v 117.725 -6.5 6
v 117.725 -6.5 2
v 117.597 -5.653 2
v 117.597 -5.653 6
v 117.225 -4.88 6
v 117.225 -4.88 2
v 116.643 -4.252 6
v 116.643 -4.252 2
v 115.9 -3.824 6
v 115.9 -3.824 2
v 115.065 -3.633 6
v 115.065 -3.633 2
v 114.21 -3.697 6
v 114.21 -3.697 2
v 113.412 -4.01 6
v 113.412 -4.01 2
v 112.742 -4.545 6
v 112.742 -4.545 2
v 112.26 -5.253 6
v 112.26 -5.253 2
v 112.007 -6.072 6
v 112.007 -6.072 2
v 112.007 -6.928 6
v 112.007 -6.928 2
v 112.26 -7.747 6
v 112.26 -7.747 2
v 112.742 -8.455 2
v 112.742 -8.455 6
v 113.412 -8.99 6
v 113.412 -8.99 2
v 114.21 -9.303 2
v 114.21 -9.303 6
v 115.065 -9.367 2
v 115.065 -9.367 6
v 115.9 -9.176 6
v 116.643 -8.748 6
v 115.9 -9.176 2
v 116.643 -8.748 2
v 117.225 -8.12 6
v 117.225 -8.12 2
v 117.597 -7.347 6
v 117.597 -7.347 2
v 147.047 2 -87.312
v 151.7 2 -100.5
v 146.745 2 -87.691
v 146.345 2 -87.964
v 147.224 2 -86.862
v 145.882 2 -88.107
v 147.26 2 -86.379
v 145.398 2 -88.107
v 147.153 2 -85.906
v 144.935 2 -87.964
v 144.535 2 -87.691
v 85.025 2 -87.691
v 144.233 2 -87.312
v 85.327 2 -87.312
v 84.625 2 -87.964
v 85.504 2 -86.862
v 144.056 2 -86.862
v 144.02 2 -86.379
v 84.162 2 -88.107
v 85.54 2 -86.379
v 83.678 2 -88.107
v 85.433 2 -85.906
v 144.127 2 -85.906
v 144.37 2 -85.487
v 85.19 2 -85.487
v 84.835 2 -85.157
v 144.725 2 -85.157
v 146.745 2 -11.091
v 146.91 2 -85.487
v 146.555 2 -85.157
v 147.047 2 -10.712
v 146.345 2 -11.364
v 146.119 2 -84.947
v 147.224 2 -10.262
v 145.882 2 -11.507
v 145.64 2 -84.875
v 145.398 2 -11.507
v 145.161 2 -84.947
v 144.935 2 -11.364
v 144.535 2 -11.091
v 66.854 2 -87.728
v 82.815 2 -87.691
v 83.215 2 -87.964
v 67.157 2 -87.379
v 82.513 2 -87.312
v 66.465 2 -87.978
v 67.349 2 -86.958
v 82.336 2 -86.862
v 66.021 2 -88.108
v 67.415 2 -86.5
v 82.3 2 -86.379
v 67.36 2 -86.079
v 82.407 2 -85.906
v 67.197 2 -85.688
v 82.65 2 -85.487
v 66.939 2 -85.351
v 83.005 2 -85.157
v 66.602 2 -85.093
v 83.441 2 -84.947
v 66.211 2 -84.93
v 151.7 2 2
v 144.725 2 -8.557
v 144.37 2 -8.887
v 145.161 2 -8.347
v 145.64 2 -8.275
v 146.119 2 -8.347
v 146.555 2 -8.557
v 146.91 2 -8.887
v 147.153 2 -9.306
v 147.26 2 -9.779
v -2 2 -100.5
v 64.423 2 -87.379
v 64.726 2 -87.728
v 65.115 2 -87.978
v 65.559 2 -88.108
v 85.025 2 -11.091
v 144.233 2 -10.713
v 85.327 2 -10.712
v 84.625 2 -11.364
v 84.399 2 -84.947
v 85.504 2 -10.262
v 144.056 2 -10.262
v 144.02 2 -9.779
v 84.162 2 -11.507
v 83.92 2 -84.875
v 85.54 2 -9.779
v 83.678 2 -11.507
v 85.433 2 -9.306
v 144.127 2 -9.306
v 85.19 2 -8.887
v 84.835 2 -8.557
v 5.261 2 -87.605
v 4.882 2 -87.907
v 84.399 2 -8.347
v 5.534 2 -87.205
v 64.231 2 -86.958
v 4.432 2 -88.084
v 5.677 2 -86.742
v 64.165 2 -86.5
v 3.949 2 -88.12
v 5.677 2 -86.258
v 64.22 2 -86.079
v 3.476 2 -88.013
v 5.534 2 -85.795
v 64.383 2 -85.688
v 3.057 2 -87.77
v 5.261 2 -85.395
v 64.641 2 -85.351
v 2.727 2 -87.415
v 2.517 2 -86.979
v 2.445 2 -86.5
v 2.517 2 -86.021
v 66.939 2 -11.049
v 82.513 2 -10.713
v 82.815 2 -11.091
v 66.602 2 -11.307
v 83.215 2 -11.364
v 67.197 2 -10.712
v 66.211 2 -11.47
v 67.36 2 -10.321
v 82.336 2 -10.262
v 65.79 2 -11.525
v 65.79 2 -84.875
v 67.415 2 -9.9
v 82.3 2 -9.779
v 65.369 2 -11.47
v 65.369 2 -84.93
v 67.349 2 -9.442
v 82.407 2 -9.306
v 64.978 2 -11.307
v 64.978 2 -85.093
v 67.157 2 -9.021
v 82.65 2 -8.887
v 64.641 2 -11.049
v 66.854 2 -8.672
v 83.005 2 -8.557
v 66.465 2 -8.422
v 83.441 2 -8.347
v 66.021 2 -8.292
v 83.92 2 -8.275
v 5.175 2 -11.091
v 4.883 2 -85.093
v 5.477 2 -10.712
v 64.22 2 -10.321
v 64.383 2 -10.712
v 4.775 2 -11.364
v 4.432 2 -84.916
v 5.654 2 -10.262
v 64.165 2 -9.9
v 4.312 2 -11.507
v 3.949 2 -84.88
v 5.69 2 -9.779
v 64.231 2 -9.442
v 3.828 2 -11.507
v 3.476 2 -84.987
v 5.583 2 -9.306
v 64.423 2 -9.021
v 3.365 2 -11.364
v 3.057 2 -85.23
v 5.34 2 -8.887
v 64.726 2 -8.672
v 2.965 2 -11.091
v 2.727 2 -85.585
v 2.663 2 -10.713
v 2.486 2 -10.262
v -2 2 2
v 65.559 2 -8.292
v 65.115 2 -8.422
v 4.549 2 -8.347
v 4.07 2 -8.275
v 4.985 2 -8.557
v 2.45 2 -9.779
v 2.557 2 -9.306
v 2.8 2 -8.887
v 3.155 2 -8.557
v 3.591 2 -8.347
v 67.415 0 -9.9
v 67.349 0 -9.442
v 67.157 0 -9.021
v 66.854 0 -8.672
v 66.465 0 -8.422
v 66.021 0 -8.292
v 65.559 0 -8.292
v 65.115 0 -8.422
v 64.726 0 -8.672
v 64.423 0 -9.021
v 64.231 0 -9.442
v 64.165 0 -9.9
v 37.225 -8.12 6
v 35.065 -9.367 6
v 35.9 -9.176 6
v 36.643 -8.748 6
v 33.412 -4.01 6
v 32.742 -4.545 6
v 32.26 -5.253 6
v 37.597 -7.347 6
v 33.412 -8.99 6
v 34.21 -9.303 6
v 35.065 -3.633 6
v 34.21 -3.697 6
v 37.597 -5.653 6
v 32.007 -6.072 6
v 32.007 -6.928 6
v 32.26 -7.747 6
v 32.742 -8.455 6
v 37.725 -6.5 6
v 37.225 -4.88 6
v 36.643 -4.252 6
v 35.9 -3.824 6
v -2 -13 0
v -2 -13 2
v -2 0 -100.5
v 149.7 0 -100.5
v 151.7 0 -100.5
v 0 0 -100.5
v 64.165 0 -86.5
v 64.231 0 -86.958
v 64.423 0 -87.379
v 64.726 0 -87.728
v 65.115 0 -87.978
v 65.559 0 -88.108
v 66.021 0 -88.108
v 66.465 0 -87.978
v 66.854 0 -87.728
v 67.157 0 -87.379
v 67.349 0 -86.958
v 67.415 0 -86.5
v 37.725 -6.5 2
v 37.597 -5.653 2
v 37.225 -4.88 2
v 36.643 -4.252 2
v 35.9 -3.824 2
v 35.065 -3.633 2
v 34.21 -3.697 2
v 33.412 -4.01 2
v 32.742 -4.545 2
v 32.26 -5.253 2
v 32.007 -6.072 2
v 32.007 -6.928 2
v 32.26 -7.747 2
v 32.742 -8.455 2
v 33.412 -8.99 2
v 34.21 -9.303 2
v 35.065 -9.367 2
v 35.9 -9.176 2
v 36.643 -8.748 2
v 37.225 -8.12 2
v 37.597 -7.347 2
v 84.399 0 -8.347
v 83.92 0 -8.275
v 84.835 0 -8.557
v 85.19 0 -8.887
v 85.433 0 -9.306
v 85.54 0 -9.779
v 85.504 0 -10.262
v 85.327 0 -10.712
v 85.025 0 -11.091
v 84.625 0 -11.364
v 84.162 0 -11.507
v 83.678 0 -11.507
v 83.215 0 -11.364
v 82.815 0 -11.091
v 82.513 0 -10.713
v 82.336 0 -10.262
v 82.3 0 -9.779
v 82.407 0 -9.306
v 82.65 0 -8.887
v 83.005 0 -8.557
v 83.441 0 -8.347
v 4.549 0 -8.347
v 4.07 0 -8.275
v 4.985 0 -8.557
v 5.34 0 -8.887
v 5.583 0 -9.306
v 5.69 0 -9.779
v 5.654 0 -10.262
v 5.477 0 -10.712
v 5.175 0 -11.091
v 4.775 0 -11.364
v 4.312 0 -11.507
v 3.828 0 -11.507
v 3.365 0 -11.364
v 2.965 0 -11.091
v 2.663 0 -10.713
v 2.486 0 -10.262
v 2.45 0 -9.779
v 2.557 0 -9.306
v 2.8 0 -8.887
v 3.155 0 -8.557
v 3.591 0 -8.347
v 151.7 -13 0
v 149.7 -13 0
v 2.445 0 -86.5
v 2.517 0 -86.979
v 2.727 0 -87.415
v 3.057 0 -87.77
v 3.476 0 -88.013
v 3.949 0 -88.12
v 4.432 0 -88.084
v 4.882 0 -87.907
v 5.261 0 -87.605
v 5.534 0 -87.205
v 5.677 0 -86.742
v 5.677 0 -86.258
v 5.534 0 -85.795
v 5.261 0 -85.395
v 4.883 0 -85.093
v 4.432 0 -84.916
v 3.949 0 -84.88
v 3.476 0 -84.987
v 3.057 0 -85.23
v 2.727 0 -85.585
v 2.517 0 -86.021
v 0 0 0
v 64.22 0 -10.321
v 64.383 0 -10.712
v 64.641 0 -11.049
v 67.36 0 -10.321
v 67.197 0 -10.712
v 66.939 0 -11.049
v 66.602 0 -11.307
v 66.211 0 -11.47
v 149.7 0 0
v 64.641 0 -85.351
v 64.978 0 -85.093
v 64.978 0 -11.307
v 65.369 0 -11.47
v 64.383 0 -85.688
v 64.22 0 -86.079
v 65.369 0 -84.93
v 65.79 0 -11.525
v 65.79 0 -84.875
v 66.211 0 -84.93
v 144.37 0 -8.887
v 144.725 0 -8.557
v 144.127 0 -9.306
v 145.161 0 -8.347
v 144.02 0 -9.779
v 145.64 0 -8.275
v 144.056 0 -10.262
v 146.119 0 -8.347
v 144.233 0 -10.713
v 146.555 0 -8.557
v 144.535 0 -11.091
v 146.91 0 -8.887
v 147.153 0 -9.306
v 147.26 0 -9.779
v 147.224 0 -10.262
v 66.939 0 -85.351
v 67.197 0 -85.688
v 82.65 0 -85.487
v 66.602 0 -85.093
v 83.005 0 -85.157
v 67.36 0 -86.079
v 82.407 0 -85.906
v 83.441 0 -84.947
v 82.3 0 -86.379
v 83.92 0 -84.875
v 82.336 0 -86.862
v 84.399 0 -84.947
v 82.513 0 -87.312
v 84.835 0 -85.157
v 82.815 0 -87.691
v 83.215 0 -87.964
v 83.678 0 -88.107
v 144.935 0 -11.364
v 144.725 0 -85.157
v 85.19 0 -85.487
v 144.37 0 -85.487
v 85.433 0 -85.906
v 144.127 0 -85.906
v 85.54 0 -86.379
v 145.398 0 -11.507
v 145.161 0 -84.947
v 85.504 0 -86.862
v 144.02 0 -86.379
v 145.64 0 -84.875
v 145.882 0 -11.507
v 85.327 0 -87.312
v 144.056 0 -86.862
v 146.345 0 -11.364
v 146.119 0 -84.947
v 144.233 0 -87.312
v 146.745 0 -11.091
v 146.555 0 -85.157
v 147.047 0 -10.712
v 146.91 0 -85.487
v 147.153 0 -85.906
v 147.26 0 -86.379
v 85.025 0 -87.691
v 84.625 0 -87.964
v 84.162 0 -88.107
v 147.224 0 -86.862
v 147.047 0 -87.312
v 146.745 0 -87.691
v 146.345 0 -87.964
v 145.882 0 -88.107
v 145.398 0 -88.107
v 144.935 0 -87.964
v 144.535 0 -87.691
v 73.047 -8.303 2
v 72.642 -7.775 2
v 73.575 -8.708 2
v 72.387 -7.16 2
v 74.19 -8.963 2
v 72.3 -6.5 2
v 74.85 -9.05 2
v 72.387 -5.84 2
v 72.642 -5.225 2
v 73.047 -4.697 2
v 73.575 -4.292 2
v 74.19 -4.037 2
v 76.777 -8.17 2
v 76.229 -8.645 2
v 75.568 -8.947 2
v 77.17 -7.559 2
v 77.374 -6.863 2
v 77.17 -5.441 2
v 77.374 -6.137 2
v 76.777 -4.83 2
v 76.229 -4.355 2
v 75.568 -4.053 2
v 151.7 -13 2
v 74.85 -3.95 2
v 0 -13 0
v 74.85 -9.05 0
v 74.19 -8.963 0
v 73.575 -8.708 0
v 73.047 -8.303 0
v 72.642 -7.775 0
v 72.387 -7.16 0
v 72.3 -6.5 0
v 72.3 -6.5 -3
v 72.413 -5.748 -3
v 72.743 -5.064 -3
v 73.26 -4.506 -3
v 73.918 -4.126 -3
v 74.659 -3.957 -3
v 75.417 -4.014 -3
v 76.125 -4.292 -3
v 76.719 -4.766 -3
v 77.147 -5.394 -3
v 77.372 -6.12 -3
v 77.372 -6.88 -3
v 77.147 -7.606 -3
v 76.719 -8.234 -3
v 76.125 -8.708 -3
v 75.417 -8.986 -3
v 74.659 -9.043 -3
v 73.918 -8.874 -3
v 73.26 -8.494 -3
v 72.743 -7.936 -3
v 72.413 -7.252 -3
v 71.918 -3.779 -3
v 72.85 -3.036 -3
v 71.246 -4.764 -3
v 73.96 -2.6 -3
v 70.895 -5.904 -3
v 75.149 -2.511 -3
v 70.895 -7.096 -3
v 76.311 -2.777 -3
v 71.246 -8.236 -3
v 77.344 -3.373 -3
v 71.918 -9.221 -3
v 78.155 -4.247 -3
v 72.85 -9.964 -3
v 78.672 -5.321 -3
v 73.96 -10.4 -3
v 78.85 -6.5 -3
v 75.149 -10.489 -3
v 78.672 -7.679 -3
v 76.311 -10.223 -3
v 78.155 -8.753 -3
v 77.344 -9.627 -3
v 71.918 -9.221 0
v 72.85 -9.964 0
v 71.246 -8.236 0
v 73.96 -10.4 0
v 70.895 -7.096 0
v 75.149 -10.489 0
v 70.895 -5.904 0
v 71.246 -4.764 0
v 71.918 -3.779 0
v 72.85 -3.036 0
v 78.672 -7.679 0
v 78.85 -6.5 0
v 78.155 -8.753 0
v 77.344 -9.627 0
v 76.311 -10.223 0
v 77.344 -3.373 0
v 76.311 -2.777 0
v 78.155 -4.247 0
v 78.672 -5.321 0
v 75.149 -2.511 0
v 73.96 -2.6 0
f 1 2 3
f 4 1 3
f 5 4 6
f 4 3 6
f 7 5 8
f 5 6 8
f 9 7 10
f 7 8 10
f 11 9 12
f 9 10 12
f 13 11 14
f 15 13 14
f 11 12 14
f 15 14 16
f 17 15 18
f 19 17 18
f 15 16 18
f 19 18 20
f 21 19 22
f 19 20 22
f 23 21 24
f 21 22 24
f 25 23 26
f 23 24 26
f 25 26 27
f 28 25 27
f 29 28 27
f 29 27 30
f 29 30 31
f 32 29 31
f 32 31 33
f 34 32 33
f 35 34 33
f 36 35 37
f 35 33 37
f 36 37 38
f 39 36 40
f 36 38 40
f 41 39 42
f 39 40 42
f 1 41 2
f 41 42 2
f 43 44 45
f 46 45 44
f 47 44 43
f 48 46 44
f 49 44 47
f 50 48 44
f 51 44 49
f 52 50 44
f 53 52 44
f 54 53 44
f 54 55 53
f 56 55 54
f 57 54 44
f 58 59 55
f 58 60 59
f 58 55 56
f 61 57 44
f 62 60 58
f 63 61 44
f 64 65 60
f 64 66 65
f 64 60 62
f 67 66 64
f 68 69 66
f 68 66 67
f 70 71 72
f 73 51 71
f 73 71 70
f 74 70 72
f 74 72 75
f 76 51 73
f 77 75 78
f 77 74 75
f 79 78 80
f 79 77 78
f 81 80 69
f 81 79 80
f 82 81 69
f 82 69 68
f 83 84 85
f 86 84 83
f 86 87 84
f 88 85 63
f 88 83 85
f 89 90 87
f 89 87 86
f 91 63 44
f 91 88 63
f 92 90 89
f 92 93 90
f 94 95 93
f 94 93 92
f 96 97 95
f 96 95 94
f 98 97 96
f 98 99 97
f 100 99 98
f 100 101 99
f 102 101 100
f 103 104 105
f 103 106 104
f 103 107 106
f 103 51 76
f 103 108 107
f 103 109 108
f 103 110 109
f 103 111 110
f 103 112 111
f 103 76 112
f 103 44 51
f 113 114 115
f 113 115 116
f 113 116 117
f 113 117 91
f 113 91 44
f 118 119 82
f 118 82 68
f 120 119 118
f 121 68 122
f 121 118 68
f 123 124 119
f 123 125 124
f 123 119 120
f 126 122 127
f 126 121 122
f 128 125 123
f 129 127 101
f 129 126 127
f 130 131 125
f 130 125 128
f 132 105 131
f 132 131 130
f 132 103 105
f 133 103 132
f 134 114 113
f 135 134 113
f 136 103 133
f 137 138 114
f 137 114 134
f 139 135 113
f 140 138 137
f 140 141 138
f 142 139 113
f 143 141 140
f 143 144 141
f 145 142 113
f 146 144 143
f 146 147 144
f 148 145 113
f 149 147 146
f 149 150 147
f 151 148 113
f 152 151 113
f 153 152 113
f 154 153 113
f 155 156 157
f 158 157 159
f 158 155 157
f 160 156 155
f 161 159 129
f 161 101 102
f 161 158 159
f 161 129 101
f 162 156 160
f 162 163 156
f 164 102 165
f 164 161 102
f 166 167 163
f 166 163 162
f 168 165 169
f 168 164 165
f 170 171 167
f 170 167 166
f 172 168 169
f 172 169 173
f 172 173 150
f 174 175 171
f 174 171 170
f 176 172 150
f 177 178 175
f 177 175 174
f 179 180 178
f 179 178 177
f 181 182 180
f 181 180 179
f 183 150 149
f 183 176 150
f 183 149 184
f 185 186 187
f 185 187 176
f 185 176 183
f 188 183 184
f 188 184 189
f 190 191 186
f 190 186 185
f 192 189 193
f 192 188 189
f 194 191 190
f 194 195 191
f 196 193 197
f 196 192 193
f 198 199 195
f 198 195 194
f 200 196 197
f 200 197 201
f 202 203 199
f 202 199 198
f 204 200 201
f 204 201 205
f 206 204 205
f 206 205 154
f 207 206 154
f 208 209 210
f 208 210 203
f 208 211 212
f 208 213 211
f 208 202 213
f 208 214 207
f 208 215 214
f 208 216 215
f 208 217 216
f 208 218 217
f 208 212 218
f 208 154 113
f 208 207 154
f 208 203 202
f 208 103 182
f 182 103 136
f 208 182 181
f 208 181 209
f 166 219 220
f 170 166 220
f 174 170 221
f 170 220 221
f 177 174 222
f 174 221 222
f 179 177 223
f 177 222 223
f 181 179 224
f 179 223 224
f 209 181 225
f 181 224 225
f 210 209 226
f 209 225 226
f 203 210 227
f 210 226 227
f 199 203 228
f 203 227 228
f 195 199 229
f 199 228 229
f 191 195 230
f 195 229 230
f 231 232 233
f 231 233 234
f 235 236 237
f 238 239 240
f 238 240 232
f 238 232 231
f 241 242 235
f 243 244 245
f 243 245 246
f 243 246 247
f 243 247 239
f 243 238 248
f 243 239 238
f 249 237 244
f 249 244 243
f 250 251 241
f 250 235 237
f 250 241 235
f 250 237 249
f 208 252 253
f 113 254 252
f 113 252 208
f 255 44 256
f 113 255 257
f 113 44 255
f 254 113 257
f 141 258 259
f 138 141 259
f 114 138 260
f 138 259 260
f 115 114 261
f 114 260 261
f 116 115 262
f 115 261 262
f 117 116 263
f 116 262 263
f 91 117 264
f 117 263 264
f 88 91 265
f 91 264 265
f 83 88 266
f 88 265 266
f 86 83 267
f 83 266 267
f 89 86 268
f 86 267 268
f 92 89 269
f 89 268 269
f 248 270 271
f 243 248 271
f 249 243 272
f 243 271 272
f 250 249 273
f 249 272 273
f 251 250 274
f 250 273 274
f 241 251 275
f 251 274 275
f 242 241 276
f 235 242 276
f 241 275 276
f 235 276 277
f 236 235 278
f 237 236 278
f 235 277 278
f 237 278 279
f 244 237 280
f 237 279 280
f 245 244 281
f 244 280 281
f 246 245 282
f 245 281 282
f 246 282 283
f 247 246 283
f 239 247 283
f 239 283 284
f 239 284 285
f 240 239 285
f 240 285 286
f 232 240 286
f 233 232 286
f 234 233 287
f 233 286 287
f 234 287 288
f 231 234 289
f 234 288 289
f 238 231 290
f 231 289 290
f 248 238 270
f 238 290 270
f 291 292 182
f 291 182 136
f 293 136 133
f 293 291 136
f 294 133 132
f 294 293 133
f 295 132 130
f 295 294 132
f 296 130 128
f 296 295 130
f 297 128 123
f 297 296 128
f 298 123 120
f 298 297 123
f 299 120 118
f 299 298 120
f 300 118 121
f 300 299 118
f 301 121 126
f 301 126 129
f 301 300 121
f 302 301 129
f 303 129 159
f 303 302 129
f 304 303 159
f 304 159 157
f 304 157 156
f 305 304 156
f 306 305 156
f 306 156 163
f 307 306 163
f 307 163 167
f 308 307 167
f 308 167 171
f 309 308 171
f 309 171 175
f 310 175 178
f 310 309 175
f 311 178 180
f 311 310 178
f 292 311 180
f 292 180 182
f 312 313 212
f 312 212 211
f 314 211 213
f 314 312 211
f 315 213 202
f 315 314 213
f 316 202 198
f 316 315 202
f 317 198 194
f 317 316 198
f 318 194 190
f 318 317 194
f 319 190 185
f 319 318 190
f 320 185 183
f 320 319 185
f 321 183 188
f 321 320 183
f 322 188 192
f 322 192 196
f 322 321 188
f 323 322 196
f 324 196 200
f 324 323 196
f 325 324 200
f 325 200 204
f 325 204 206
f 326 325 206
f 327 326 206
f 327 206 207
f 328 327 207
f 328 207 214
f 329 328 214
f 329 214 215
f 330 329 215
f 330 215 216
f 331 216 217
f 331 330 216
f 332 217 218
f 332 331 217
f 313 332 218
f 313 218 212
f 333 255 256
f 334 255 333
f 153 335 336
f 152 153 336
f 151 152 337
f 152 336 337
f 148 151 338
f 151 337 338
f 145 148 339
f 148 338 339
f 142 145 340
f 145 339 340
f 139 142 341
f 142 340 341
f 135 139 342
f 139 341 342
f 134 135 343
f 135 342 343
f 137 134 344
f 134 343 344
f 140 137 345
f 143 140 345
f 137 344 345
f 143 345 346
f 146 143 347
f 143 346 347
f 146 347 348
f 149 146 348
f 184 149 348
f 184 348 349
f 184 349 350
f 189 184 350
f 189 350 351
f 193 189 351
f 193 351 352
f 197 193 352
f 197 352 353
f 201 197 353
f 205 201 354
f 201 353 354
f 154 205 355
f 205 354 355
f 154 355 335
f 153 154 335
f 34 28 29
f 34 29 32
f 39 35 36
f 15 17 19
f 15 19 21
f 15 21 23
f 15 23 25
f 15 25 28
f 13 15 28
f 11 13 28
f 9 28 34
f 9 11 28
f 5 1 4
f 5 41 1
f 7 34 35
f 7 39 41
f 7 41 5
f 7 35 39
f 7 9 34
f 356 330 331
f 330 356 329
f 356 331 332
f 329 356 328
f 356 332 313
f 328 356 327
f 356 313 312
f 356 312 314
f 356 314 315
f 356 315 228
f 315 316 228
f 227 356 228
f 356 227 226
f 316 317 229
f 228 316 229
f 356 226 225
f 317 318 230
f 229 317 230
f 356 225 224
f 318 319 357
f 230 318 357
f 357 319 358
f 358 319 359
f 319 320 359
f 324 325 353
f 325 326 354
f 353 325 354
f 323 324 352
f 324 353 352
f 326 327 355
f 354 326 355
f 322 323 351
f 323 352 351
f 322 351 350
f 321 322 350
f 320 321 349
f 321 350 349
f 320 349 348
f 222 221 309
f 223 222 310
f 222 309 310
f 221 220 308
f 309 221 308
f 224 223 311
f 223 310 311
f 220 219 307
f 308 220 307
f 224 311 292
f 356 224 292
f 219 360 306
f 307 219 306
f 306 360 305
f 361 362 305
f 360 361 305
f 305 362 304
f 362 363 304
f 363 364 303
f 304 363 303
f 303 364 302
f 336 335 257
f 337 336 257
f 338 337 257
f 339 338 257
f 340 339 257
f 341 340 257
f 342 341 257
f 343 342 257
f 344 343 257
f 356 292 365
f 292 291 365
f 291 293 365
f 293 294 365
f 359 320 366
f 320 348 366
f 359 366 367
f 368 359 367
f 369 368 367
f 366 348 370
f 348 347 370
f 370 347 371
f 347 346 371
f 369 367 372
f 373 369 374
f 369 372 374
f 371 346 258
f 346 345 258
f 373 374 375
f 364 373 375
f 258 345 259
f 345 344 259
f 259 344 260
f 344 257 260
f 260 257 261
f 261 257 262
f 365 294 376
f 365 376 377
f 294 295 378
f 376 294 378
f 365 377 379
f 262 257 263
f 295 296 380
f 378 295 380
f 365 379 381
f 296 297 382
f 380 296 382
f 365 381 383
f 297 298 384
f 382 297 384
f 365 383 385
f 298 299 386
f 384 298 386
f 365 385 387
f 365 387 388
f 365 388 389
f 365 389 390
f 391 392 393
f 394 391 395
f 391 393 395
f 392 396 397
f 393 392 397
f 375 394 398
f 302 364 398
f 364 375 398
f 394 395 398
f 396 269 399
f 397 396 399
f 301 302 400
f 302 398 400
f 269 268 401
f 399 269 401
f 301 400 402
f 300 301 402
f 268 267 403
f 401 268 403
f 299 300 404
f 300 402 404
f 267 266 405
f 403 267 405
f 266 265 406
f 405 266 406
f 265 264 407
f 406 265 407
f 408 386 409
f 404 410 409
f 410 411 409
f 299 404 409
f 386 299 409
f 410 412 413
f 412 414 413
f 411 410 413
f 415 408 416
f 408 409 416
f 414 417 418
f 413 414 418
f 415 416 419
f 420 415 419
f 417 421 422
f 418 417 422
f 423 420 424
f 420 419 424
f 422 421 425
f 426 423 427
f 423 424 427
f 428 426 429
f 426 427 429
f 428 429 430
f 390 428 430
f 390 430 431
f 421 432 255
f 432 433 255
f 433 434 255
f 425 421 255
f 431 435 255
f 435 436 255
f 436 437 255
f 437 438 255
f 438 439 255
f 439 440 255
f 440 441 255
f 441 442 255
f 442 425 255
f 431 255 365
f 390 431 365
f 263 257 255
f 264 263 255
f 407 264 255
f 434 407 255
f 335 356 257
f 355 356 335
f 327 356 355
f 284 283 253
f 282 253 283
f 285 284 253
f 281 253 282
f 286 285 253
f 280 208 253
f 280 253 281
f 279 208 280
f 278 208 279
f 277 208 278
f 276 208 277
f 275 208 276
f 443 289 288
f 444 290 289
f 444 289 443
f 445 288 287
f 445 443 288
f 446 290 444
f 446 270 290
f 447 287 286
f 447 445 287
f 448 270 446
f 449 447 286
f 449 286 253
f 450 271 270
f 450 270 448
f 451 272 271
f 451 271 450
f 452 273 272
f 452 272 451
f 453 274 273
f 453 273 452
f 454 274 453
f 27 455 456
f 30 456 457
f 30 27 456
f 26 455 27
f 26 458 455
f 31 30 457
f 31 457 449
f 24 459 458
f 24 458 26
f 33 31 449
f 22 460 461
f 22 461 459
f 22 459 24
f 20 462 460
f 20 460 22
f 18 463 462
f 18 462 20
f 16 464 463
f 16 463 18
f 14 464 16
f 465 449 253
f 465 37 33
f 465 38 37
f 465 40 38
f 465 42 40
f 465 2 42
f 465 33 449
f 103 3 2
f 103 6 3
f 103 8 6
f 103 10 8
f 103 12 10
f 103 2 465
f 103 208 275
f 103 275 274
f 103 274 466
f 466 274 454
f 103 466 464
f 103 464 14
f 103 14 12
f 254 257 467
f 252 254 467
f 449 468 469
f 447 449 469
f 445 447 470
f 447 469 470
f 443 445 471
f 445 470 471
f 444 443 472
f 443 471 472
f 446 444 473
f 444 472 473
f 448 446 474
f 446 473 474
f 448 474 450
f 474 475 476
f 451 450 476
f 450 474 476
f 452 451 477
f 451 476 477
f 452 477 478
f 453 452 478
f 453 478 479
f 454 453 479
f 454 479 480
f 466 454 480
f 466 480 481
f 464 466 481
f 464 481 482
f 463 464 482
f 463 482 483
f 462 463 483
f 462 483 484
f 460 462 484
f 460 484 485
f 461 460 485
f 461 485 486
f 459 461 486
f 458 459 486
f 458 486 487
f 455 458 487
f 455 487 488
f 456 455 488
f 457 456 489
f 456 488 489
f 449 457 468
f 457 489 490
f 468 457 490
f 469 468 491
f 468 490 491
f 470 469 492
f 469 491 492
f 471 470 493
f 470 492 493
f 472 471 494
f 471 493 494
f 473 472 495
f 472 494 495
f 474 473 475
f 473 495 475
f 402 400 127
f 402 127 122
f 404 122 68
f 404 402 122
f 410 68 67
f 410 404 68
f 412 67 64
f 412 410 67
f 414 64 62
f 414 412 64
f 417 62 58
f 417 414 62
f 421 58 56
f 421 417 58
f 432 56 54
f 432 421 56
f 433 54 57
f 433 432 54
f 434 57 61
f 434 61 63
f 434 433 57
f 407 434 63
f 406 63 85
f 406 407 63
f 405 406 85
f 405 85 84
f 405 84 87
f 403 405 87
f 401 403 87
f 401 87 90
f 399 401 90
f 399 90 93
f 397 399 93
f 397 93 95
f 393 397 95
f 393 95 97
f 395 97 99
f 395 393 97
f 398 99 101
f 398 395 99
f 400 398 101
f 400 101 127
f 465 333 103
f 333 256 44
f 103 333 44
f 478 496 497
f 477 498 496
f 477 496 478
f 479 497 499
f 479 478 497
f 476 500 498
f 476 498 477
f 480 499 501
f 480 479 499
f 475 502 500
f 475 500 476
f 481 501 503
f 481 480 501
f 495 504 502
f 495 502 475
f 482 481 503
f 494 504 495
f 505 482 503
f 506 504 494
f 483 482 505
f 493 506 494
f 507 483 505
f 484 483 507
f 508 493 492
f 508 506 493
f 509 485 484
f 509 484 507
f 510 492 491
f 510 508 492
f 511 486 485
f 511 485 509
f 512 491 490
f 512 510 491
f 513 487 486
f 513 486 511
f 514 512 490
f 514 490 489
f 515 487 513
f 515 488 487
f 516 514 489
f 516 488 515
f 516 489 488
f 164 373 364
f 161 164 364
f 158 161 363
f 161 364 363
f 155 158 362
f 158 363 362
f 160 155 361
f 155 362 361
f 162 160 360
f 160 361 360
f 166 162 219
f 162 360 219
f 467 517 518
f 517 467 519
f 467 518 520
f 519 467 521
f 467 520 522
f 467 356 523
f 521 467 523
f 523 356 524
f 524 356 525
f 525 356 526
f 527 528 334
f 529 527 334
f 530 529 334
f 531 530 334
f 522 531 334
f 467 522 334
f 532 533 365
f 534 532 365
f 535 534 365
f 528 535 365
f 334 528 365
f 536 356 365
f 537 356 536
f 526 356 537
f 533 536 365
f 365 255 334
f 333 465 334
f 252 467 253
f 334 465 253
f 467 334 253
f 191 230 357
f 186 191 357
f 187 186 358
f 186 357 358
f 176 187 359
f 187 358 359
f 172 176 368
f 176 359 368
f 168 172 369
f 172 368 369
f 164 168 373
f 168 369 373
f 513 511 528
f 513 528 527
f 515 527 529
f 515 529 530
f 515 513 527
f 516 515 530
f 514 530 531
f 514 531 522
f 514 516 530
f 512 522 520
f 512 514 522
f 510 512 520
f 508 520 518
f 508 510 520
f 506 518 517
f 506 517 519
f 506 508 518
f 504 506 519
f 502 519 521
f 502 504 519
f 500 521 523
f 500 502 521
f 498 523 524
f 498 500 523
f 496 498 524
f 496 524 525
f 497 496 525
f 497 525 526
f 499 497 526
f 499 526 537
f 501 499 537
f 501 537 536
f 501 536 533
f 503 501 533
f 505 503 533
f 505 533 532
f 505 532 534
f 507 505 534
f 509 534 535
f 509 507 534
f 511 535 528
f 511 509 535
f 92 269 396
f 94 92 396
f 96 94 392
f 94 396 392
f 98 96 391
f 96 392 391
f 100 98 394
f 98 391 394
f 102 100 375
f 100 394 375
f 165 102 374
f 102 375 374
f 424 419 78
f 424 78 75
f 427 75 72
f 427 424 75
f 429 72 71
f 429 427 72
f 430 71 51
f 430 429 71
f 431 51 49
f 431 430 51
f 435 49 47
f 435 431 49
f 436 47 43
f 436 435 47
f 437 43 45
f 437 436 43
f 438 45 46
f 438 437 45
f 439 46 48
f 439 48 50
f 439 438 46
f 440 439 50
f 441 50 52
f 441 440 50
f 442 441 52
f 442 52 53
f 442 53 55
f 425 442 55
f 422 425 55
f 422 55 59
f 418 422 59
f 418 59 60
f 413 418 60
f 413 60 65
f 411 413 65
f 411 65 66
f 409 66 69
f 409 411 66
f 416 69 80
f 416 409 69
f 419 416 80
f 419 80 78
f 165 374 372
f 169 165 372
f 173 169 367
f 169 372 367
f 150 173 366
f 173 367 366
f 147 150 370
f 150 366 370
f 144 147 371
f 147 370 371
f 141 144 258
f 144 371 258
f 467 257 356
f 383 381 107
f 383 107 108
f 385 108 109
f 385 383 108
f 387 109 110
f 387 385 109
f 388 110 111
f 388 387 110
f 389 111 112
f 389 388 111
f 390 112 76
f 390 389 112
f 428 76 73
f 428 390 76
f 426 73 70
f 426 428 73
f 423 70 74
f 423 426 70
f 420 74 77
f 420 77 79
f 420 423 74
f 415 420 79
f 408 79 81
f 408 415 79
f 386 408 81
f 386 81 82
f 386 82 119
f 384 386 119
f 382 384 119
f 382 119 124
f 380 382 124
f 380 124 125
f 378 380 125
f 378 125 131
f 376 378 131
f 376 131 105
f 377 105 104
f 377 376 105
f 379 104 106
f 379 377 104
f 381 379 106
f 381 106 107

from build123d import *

# Parameters (mm, degrees)
SKETCH1_W           = 10
SKETCH1_H           = 100.5
SKETCH1_R           = 1.625
SKETCH1_W_2         = 69.85
BOSS_EXTRUDE1_DEPTH = 2
SKETCH3_W           = 149.7
SKETCH3_H           = 2
BOSS_EXTRUDE2_DEPTH = 2
SKETCH4_W           = 100.5
SKETCH4_H           = 2
BOSS_EXTRUDE3_DEPTH = 2
BOSS_EXTRUDE4_DEPTH = 2
SKETCH6_W           = 8
SKETCH6_H           = 15
BOSS_EXTRUDE5_DEPTH = 3
CUT_EXTRUDE1_DEPTH  = 10
FILLET1_R           = 3
CUT_EXTRUDE2_DEPTH  = 10
BOSS_EXTRUDE6_START = 3
SKETCH10_R          = 4
SKETCH10_R_2        = 2.55
BOSS_EXTRUDE6_DEPTH = 3
SKETCH12_R          = 2.875
BOSS_EXTRUDE7_DEPTH = 4
SKETCH13_W          = 10.946886228
SKETCH13_H          = 17.580383234
SKETCH13_W_2        = 10.296538922
SKETCH13_H_2        = 23.433508982
CUT_EXTRUDE3_DEPTH  = 43


with BuildPart() as part:
    # Sketch1 → Boss-Extrude1 (new body)
    # profile 1 of 3: a face of its own
    with BuildSketch(Plane(origin=(0, 0, 0), x_dir=(1, 0, 0), z_dir=(0, 1, 0))):
        with Locations((74.85, 50.25)):
            Rectangle(SKETCH1_W, SKETCH1_H)
    # profile 2 of 3: a face of its own
    with BuildSketch(Plane(origin=(0, 0, 0), x_dir=(1, 0, 0), z_dir=(0, 1, 0))):
        Polygon((0, 0), (69.85, 0), (69.85, 100.5), (0, 100.5), (0, 86.5), align=None)
        with Locations(Location((4.07, 9.9, 0), (0, 0, 270))):
            Circle(SKETCH1_R, mode=Mode.SUBTRACT)
        with BuildLine():
            ThreePointArc((64.165, 9.9), (64.640951481, 11.049048519), (65.79, 11.525))
            ThreePointArc((65.79, 11.525), (66.939048519, 11.049048519), (67.415, 9.9))
            ThreePointArc((67.415, 9.9), (65.79, 8.275), (64.165, 9.9))
        make_face(mode=Mode.SUBTRACT)
        with BuildLine():
            ThreePointArc((5.695, 86.5), (4.07, 84.875), (2.445, 86.5))
            ThreePointArc((2.445, 86.5), (4.07, 88.125), (5.695, 86.5))
        make_face(mode=Mode.SUBTRACT)
        with BuildLine():
            ThreePointArc((65.79, 84.875), (64.640951481, 85.350951481), (64.165, 86.5))
            ThreePointArc((64.165, 86.5), (65.79, 88.125), (67.415, 86.5))
            ThreePointArc((67.415, 86.5), (66.939048519, 85.350951481), (65.79, 84.875))
        make_face(mode=Mode.SUBTRACT)
    # profile 3 of 3: a face of its own
    with BuildSketch(Plane(origin=(0, 0, 0), x_dir=(1, 0, 0), z_dir=(0, 1, 0))):
        with Locations((114.775, 50.25)):
            Rectangle(SKETCH1_W_2, SKETCH1_H)
        with Locations(Location((83.92, 9.9, 0), (0, 0, 270))):
            Circle(SKETCH1_R, mode=Mode.SUBTRACT)
        with Locations(Location((145.64, 9.9, 0), (0, 0, 270))):
            Circle(SKETCH1_R, mode=Mode.SUBTRACT)
        with Locations(Location((83.92, 86.5, 0), (0, 0, 270))):
            Circle(SKETCH1_R, mode=Mode.SUBTRACT)
        with Locations(Location((145.64, 86.5, 0), (0, 0, 270))):
            Circle(SKETCH1_R, mode=Mode.SUBTRACT)
    extrude(amount=BOSS_EXTRUDE1_DEPTH)

    # Sketch3 → Boss-Extrude2 (add)
    with BuildSketch(Plane.XY):
        Polygon((-10, 2), (-10, -13), (159.7, -13), (159.7, 2), (149.7, 2), (149.7, 0), (0, 0), (0, 2), align=None)
        with Locations((74.85, 1)):
            Rectangle(SKETCH3_W, SKETCH3_H)
    extrude(amount=BOSS_EXTRUDE2_DEPTH)

    # Sketch4 → Boss-Extrude3 (add)
    with BuildSketch(Plane.ZY):
        Polygon((0, 0), (-100.5, 0), (0, -13), align=None)
        with Locations((-50.25, 1)):
            Rectangle(SKETCH4_W, SKETCH4_H)
    extrude(amount=BOSS_EXTRUDE3_DEPTH)

    # Sketch5 → Boss-Extrude4 (add)
    with BuildSketch(Plane(origin=(149.7, 0, 0), x_dir=(0, 0, -1), z_dir=(1, 0, 0))):
        Polygon((100.5, 0), (0, -13), (0, 2), (100.5, 2), align=None)
    extrude(amount=BOSS_EXTRUDE4_DEPTH)

    # Sketch6 → Boss-Extrude5 (add)
    with BuildSketch(Plane(origin=(0, 0, 0), x_dir=(-1, 0, 0), z_dir=(0, 0, -1))):
        with Locations((6, -5.5)):
            Rectangle(SKETCH6_W, SKETCH6_H)
        with Locations((-155.7, -5.5)):
            Rectangle(SKETCH6_W, SKETCH6_H)
    extrude(amount=BOSS_EXTRUDE5_DEPTH)

    # Sketch8 → Cut-Extrude1 (cut)
    with BuildSketch(Plane(origin=(0, 0, -3), x_dir=(-1, 0, 0), z_dir=(0, 0, -1))):
        with BuildLine():
            ThreePointArc((-153.15, -5.5), (-155.7, -2.95), (-158.25, -5.5))
            Line((-158.25, -5.5), (-153.15, -5.5))
        make_face()
        with BuildLine():
            Line((-153.15, -5.5), (-158.25, -5.5))
            ThreePointArc((-158.25, -5.5), (-155.7, -8.05), (-153.15, -5.5))
        make_face()
        with BuildLine():
            ThreePointArc((3.45, -5.5), (6, -8.05), (8.55, -5.5))
            Line((8.55, -5.5), (3.45, -5.5))
        make_face()
        with BuildLine():
            Line((3.45, -5.5), (8.55, -5.5))
            ThreePointArc((8.55, -5.5), (6, -2.95), (3.45, -5.5))
        make_face()
    extrude(amount=-CUT_EXTRUDE1_DEPTH, mode=Mode.SUBTRACT)

    # Fillet1
    fillet1_edges = [part.edges().sort_by_distance(p)[0] for p in [
        (159.7, 2, -0.5),
        (-10, 2, -0.5),
        (-10, -13, -0.5),
        (159.7, -13, -0.5),
    ]]
    fillet(fillet1_edges, radius=FILLET1_R)

    # Sketch9 → Cut-Extrude2 (cut)
    with BuildSketch(Plane(origin=(0, 0, 0), x_dir=(-1, 0, 0), z_dir=(0, 0, -1))):
        with BuildLine():
            ThreePointArc((-72.3, -6.5), (-73.046877708, -4.696877708), (-74.85, -3.95))
            Line((-74.85, -3.95), (-74.85, -9.05))
            ThreePointArc((-74.85, -9.05), (-73.046877708, -8.303122292), (-72.3, -6.5))
        make_face()
        with BuildLine():
            Line((-74.85, -9.05), (-74.85, -3.95))
            ThreePointArc((-74.85, -3.95), (-77.4, -6.5), (-74.85, -9.05))
        make_face()
    extrude(amount=-CUT_EXTRUDE2_DEPTH, mode=Mode.SUBTRACT)

    # Sketch10 → Boss-Extrude6 (add)
    with BuildSketch(Plane(origin=(0, 0, 0), x_dir=(-1, 0, 0), z_dir=(0, 0, -1)).offset(BOSS_EXTRUDE6_START)):
        with Locations(Location((-74.85, -6.5, 0), (0, 0, 180))):
            Circle(SKETCH10_R)
        with Locations((-74.85, -6.5)):
            Circle(SKETCH10_R_2, mode=Mode.SUBTRACT)
    extrude(amount=-BOSS_EXTRUDE6_DEPTH)

    # Sketch12 → Boss-Extrude7 (add)
    with BuildSketch(Plane.XY.offset(2)):
        with Locations((34.85, -6.5)):
            Circle(SKETCH12_R)
        with Locations((114.85, -6.5)):
            Circle(SKETCH12_R)
    extrude(amount=BOSS_EXTRUDE7_DEPTH)

    # Sketch13 → Cut-Extrude3 (cut)
    with BuildSketch(Plane(origin=(0, 0, -3), x_dir=(-1, 0, 0), z_dir=(0, 0, -1))):
        with Locations((-157.173443114, -6.790191617)):
            Rectangle(SKETCH13_W, SKETCH13_H)
        with Locations((7.148269461, -9.716754491)):
            Rectangle(SKETCH13_W_2, SKETCH13_H_2)
    extrude(amount=-CUT_EXTRUDE3_DEPTH, mode=Mode.SUBTRACT)


solid = part.part
